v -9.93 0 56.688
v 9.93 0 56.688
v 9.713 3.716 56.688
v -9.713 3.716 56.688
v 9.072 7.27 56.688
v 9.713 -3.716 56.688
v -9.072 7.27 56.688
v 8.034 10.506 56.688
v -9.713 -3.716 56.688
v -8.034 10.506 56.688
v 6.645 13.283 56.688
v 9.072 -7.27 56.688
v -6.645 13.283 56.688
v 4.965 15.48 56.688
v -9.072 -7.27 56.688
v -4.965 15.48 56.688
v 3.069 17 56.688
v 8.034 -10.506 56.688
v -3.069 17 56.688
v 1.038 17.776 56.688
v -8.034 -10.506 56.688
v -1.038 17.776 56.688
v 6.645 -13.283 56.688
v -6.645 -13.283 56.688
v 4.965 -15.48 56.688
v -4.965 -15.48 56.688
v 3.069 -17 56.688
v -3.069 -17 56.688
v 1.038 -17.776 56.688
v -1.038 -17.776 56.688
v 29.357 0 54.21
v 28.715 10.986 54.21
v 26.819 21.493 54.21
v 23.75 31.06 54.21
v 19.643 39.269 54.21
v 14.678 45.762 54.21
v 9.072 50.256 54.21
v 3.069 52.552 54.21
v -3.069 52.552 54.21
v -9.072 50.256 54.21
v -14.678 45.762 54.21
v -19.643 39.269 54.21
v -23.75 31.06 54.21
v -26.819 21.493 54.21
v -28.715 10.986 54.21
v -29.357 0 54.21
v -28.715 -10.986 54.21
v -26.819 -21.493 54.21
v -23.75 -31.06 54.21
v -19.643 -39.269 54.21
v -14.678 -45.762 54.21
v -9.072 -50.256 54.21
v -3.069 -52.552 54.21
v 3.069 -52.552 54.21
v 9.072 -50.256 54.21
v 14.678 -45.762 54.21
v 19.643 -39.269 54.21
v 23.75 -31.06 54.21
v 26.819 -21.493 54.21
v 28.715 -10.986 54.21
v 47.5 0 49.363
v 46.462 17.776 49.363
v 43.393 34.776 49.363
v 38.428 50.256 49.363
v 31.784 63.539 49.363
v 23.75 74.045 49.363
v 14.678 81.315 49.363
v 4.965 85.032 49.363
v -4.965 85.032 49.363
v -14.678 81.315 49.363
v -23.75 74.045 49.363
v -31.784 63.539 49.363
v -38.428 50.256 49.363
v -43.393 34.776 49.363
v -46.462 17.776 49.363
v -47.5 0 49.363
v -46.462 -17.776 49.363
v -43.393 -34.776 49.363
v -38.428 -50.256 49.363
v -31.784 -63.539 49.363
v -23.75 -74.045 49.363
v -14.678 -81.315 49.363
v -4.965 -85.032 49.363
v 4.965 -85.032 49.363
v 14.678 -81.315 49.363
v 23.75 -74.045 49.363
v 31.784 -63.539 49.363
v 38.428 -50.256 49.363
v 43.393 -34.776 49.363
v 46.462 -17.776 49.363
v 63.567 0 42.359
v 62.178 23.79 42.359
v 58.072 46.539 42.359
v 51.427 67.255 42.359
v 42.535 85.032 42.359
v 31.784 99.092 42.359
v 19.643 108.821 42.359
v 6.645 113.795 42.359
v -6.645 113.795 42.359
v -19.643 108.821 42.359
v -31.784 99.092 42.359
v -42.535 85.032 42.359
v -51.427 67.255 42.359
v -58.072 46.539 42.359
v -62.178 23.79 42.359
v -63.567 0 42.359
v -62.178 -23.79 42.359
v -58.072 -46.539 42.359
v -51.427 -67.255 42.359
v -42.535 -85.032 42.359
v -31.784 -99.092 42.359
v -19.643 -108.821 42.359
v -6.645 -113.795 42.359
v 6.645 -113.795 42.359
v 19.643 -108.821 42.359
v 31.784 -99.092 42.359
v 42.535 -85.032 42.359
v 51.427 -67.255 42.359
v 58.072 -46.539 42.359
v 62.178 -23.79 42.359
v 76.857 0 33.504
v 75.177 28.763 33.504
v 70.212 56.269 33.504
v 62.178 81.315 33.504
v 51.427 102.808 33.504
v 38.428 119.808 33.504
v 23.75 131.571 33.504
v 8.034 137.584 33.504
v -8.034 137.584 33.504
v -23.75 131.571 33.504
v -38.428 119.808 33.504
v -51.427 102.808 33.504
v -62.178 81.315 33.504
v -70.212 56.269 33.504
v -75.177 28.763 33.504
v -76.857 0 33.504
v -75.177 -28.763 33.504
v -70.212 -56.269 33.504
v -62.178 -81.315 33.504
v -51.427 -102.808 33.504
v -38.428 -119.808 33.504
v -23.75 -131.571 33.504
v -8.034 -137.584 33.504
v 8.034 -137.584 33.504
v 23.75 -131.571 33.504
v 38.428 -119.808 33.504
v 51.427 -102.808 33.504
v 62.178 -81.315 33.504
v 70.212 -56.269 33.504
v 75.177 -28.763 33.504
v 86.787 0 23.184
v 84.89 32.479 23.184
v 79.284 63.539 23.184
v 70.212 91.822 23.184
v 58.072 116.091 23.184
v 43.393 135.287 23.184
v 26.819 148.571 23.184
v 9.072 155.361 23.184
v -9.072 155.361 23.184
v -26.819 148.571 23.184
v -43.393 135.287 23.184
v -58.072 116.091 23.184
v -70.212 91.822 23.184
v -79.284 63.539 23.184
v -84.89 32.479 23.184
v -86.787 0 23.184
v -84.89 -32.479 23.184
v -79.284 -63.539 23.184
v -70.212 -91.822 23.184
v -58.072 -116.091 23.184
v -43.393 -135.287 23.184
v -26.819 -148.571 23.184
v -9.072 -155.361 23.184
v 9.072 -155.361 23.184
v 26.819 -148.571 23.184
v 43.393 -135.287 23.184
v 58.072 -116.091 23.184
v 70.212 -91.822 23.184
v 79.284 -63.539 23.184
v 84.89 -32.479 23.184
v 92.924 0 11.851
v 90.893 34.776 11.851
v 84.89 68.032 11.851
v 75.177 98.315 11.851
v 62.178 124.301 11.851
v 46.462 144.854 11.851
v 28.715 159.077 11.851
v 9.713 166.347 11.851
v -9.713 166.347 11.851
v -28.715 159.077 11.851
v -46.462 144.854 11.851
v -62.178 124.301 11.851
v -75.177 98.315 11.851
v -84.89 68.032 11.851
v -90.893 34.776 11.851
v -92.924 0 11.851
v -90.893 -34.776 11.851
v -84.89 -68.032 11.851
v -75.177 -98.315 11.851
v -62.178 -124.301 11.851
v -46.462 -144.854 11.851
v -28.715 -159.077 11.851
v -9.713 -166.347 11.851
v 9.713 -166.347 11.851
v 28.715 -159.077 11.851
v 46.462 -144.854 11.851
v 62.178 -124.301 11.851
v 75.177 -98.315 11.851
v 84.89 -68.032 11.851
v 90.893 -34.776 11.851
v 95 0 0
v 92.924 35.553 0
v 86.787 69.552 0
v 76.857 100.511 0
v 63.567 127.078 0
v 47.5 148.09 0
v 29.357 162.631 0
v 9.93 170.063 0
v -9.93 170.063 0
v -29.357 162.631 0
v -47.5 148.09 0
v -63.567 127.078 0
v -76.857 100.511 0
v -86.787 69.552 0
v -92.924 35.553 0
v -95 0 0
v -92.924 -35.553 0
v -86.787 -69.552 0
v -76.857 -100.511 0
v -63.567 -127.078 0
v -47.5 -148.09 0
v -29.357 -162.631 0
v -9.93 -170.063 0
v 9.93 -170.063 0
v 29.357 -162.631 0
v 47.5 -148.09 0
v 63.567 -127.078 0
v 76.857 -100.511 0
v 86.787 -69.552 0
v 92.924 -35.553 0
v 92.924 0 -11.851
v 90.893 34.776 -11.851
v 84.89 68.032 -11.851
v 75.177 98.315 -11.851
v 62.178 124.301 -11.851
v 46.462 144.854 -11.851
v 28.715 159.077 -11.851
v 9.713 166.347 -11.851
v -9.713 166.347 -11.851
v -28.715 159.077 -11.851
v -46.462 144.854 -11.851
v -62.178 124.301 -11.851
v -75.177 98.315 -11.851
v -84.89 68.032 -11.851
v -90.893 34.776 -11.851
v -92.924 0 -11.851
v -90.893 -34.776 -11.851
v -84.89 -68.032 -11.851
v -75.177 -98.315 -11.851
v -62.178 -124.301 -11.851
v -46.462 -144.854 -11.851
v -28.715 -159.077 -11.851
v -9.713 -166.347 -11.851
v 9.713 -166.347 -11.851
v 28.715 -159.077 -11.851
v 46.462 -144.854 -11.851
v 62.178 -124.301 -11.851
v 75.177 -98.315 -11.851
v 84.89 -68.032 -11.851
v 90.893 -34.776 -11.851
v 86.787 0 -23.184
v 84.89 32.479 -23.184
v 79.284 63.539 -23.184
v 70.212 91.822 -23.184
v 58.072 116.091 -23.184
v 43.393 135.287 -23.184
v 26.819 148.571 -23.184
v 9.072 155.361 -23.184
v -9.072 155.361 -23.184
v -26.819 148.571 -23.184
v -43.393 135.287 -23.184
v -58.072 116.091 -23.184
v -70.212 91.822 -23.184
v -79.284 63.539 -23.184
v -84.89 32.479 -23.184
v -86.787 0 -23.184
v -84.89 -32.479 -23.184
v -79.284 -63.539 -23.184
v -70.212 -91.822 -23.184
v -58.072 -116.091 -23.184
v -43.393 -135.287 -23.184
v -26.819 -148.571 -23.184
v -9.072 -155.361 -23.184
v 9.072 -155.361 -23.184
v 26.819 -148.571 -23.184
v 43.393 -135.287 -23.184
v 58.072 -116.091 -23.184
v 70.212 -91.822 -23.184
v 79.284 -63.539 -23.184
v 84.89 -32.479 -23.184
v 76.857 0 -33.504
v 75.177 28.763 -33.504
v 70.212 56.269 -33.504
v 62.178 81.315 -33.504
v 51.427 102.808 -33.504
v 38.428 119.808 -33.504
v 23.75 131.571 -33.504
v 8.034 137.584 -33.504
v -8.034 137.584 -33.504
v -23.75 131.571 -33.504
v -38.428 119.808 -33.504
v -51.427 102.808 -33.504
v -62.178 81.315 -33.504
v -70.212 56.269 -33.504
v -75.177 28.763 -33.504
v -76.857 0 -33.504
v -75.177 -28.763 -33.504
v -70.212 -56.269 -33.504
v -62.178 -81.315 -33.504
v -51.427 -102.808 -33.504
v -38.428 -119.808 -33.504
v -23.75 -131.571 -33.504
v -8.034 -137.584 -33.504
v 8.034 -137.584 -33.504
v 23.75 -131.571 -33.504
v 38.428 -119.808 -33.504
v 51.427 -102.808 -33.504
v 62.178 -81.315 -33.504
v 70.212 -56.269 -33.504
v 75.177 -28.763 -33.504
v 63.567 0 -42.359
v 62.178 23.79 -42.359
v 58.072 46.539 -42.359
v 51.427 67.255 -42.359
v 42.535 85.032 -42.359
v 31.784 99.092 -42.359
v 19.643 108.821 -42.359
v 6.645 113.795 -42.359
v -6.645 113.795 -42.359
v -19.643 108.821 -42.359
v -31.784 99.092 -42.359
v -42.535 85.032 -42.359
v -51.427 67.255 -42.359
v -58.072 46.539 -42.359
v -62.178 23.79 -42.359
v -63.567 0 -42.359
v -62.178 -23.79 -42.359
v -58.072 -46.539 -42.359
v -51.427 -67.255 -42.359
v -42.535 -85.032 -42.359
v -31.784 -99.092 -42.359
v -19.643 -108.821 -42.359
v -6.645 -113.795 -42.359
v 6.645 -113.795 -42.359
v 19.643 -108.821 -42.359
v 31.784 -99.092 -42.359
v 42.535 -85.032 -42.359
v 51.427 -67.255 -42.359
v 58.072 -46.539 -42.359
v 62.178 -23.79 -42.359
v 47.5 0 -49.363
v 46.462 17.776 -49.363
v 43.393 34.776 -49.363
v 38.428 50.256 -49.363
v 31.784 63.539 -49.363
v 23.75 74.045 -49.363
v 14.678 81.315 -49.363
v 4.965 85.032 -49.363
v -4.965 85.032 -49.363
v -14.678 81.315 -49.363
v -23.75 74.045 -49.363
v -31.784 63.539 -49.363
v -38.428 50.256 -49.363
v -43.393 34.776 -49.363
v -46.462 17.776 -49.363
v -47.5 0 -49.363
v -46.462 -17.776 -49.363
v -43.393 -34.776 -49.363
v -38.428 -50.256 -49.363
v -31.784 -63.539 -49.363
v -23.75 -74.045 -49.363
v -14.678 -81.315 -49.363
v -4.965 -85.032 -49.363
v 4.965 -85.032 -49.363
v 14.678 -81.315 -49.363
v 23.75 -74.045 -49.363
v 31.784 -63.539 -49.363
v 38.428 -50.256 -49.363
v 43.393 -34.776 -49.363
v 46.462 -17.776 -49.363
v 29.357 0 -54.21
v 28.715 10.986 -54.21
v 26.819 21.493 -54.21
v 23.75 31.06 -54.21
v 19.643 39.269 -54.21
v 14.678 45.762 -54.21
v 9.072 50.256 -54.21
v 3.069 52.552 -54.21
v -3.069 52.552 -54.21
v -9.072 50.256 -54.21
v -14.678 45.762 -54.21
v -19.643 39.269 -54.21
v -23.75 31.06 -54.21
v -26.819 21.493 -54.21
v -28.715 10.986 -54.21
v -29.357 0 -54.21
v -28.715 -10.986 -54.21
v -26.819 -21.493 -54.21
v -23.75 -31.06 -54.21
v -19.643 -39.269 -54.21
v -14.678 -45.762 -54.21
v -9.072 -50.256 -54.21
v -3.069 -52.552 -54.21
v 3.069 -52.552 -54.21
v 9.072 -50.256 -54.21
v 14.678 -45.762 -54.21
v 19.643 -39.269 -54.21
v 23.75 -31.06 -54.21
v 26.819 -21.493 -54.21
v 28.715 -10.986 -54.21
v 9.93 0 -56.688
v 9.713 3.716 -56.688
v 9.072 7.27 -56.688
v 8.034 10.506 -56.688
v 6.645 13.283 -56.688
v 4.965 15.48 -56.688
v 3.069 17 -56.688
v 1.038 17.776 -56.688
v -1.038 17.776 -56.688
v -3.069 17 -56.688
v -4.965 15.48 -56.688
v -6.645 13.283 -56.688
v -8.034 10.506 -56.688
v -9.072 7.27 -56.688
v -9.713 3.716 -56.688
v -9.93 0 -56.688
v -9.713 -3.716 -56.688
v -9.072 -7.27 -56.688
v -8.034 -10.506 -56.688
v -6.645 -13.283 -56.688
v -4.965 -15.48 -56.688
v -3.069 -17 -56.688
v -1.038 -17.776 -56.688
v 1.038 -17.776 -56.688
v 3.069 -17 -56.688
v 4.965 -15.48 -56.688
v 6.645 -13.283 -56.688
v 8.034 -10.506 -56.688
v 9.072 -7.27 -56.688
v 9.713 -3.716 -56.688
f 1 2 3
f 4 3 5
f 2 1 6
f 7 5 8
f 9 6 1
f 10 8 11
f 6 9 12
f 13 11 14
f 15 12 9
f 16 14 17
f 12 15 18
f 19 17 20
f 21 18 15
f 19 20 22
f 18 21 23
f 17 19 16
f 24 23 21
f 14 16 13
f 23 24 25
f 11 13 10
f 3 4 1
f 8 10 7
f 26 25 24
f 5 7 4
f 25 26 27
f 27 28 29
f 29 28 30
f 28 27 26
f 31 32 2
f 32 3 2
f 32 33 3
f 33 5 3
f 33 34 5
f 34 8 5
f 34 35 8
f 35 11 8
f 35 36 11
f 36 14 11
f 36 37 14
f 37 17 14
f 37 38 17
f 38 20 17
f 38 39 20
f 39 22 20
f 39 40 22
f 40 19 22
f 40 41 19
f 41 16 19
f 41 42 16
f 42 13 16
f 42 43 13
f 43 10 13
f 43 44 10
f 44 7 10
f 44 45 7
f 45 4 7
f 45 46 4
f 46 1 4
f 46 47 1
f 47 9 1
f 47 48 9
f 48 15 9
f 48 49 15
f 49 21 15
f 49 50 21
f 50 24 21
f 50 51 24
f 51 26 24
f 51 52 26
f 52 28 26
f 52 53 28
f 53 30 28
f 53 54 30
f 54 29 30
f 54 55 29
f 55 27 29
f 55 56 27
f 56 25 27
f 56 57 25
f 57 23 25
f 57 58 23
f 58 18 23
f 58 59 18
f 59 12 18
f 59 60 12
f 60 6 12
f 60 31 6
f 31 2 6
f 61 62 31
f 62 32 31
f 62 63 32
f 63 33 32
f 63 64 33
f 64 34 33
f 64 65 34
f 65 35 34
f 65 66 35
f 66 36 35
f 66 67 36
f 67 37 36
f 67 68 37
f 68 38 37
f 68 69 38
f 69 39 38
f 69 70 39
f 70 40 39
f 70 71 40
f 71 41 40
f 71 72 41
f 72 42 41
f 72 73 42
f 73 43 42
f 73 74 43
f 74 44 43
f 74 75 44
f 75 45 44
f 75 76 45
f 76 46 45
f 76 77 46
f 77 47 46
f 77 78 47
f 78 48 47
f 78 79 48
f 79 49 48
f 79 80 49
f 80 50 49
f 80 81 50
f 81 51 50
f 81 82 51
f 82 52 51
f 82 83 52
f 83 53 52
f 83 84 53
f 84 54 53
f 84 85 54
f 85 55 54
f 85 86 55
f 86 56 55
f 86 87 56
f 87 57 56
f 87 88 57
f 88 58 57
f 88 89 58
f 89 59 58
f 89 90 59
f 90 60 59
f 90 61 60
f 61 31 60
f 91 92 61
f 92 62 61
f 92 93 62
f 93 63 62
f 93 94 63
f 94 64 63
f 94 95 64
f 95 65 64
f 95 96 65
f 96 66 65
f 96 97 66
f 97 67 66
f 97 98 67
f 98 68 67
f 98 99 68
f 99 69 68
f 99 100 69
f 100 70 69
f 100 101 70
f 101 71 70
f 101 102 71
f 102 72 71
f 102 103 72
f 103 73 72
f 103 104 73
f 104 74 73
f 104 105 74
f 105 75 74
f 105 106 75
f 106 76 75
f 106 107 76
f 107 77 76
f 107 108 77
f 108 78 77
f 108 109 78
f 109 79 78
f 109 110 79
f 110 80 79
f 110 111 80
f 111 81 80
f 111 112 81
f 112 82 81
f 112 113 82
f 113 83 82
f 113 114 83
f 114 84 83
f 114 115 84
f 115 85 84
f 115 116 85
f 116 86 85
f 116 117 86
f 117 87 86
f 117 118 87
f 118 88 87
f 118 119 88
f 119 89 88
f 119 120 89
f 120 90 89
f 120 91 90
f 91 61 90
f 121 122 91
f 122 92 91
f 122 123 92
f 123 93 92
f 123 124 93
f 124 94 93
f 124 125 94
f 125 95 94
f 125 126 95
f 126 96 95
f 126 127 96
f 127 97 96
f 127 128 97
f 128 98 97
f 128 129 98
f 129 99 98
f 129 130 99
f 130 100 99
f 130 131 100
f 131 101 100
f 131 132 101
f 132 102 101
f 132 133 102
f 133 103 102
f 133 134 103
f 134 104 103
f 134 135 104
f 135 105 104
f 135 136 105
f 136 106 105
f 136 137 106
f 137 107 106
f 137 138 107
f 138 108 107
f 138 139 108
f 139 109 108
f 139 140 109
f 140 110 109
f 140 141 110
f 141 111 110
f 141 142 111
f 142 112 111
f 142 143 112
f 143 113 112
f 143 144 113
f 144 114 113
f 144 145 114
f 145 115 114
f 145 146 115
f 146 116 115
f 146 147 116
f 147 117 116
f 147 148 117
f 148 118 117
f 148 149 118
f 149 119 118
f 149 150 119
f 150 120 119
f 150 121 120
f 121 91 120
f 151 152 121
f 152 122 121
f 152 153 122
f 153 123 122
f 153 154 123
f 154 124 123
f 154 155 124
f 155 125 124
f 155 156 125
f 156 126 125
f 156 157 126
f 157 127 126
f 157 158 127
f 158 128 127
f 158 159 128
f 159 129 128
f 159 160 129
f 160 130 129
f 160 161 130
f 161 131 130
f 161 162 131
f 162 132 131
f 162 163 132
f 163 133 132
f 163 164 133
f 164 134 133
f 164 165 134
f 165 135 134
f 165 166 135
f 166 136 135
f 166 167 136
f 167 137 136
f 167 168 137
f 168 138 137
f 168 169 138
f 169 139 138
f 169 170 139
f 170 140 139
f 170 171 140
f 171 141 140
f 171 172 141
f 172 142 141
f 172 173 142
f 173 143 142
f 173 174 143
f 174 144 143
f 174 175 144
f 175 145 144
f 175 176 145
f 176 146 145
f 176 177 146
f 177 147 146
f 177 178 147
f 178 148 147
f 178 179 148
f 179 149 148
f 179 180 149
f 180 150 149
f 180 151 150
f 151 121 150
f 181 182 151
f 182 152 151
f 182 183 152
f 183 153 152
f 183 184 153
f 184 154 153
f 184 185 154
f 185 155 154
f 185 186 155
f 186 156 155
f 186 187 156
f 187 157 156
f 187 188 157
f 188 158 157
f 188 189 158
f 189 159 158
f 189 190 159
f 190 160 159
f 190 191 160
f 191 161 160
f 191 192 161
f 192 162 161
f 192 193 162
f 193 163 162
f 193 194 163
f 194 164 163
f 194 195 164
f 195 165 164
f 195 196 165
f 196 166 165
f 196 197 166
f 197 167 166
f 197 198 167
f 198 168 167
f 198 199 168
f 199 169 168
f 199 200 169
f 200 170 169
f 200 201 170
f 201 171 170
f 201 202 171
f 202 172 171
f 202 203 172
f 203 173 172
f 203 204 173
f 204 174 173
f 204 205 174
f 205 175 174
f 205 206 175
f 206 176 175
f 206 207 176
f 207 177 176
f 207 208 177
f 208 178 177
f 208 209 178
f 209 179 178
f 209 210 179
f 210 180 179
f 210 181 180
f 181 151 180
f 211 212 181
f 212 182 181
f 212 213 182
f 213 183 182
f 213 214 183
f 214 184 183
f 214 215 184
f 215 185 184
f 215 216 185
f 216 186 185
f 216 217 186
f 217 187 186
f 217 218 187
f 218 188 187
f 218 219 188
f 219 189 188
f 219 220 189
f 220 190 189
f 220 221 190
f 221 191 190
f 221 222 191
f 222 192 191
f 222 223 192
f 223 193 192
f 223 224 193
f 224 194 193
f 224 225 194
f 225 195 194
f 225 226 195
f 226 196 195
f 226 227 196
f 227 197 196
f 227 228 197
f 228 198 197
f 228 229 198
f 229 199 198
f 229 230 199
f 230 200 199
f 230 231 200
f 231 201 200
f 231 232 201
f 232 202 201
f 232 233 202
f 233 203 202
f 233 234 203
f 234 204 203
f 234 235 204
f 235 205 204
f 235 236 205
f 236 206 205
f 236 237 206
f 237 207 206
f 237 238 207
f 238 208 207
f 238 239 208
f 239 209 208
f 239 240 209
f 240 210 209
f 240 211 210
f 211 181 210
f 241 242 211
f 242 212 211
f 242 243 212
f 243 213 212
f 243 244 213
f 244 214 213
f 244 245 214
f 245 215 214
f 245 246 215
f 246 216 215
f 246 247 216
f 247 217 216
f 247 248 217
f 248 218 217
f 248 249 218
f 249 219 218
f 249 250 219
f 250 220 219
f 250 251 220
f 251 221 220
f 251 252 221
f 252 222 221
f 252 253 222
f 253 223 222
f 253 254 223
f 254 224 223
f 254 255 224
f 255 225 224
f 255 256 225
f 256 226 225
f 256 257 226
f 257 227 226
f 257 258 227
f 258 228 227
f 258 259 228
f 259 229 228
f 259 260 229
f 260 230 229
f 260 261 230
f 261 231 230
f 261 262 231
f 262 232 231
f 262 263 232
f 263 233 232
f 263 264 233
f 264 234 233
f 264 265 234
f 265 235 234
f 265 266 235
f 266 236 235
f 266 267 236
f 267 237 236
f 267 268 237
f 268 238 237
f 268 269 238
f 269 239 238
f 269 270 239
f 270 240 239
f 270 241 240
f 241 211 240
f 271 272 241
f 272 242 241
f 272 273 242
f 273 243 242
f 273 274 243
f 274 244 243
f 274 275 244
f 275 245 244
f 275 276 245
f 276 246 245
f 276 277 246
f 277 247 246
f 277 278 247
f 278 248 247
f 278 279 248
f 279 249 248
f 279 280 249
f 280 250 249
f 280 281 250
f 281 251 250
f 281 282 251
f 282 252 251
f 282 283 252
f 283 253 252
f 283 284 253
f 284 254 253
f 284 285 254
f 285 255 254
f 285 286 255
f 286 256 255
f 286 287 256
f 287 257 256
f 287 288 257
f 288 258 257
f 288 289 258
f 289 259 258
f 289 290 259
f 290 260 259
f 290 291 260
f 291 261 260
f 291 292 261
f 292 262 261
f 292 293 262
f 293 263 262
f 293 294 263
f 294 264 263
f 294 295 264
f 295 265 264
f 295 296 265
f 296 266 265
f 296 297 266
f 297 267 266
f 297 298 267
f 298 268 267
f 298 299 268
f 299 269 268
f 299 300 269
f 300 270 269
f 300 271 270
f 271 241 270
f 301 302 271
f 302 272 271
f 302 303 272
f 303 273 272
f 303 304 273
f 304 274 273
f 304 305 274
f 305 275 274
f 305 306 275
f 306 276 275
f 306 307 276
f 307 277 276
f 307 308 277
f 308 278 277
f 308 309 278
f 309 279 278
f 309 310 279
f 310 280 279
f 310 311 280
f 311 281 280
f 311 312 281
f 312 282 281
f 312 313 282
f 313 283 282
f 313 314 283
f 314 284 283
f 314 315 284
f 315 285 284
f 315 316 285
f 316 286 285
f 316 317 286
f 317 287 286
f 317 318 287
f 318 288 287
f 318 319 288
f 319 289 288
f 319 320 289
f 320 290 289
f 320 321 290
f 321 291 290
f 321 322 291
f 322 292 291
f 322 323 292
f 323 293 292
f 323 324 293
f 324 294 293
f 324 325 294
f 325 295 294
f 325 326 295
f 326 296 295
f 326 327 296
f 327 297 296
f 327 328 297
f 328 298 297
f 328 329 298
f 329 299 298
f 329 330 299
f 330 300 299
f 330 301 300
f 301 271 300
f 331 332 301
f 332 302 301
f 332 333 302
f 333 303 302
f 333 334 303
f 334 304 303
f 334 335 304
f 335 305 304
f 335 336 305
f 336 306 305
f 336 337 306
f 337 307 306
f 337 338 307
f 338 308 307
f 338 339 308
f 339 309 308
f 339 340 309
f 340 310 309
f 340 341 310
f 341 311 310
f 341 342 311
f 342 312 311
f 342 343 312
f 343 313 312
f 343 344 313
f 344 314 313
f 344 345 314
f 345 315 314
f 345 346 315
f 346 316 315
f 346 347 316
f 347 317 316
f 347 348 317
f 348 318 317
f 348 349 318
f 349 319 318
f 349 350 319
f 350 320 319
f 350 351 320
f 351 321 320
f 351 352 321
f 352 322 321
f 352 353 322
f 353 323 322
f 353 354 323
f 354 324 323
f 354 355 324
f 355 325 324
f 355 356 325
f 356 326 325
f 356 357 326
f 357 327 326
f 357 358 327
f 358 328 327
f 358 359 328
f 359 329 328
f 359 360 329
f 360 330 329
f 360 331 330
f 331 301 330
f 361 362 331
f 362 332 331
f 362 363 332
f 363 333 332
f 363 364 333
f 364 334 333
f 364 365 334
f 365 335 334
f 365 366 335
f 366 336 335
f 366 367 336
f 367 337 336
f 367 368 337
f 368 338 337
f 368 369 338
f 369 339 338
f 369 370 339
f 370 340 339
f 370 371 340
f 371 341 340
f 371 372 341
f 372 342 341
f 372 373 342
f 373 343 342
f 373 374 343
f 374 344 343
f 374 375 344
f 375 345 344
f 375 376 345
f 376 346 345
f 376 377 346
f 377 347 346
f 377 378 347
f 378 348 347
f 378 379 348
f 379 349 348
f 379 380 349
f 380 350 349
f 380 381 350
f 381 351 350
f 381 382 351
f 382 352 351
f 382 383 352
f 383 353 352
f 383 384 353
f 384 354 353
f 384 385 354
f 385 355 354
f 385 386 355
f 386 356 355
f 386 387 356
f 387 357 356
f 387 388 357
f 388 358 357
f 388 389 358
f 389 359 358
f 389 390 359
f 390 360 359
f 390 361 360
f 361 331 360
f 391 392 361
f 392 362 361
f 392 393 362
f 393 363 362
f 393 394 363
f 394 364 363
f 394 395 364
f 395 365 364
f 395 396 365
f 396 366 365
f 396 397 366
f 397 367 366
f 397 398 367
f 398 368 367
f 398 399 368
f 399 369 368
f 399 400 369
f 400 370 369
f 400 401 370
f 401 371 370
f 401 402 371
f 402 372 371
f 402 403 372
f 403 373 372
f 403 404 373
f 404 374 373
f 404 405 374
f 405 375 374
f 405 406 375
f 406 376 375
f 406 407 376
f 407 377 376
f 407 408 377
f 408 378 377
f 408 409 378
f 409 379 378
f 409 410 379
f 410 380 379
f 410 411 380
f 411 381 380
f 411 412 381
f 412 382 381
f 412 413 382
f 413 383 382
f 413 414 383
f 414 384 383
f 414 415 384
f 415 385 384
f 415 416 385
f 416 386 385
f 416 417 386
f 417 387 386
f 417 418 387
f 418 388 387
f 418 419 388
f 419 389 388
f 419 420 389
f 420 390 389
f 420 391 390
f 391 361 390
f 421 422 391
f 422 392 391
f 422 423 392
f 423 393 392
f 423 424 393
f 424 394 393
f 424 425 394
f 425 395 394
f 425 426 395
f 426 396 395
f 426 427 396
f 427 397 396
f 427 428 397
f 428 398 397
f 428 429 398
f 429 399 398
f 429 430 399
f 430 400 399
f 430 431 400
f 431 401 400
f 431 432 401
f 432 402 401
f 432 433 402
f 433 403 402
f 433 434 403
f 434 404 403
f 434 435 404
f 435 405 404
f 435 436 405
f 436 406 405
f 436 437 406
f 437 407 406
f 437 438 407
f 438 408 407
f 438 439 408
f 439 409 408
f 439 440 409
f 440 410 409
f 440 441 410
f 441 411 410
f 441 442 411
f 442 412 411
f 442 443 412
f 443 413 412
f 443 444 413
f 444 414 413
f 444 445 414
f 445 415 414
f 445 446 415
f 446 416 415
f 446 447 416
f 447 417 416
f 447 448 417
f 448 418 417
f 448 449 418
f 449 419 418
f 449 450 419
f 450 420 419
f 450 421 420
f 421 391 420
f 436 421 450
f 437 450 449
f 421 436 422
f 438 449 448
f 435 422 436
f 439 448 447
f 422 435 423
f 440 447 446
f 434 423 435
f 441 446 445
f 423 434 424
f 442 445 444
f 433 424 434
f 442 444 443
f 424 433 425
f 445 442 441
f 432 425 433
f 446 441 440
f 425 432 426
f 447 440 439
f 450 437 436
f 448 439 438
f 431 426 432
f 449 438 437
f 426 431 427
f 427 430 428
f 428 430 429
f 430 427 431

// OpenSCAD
// Generated by SolidPython 1.0.1 on 2020-07-29 00:46:46


scale(v = [5, 9, 3]) {
	sphere(r = 19);
}
/***********************************************
*********      SolidPython code:      **********
************************************************
 
# import packages: SolidPython
from solid import *
from solid.utils import *
from itertools import chain, combinations, permutations


class Resize:

    def __init__(self, scad_file):
        self.scad_file = scad_file
        #self.scad_file = import_scad(scad_file)
        # cone/cylinder param:
        self.r1 = 0
        self.r2 = 0
        self.h = 0
        # rectangular prism param:
        self.w = 0
        self.l = 0
        # ellipse param:
        self.r = 0

    # import OpenScad code (file name corresponds to shape)


    # classify shape + parameters
    def assign(self, param1, param2, param3):
        if self.scad_file == 'cone.scad':
            self.r1 = param1
            self.r2 = param2
            self.h = param3
        elif self.scad_file == 'cylinder.scad':
            self.r1 = param1
            self.r2 = param2
            self.h = param3
        elif self.scad_file == 'rectangularPrism.scad':
            self.h = param1
            self.l = param2
            self.w = param3
        else:
            self.r = param1
            self.h = param2

    # resize parameters
    def iterate(self):
        x = range(3, 20, 2)
        i = 1
        if self.scad_file == 'cone.scad':
            tempList = list(permutations(x, 2))
            for temp in tempList:
                param1 = temp[0]
                param2 = temp[1]
                filepath = 'produced_scad_files/' + 'cone' + str(param1) + '_' + str(param2) + '_' + '.scad'
                scad_render_to_file(cylinder(h=param1, r1=param2, r2=0), filepath)

        elif self.scad_file == 'cylinder.scad':
            tempList = list(permutations(x, 3))
            for temp in tempList:
                param1 = temp[0]
                param2 = temp[1]
                filepath = 'produced_scad_files/' + 'cylinder' + str(param1) + '_' + str(param2) + '_' + '.scad'
                scad_render_to_file(cylinder(h=param1, r1=param2, r2=param2), filepath)

        elif self.scad_file == 'rectangularPrism.scad':
            tempList = list(permutations(x, 3))
            for temp in tempList:
                param1 = temp[0]
                param2 = temp[1]
                param3 = temp[2]
                filepath = 'produced_scad_files/' + 'rectangularPrism' + str(param1) + '_' + str(param2) + '_' + str(
                    param3) + '.scad'
                scad_render_to_file(cube(size=(param1, param2, param3)), filepath)

        elif self.scad_file == 'ellipse.scad':
            tempList = list(permutations(x, 4))
            for temp in tempList:
                param1 = temp[0]
                param2 = temp[1]
                param3 = temp[2]
                param4 = temp[3]
                filepath = 'produced_scad_files/' + 'ellipse' + str(param1) + '_' + str(param2) + '_' + str(param3) + '_' + str(param4) + '.scad'
                scad_render_to_file(scale([param1, param2, param3])(sphere(r=param4)), filepath)

    def render_to_scadfile(self):
        scad_render_to_file(scad, 'example.scad') 
 
************************************************/
